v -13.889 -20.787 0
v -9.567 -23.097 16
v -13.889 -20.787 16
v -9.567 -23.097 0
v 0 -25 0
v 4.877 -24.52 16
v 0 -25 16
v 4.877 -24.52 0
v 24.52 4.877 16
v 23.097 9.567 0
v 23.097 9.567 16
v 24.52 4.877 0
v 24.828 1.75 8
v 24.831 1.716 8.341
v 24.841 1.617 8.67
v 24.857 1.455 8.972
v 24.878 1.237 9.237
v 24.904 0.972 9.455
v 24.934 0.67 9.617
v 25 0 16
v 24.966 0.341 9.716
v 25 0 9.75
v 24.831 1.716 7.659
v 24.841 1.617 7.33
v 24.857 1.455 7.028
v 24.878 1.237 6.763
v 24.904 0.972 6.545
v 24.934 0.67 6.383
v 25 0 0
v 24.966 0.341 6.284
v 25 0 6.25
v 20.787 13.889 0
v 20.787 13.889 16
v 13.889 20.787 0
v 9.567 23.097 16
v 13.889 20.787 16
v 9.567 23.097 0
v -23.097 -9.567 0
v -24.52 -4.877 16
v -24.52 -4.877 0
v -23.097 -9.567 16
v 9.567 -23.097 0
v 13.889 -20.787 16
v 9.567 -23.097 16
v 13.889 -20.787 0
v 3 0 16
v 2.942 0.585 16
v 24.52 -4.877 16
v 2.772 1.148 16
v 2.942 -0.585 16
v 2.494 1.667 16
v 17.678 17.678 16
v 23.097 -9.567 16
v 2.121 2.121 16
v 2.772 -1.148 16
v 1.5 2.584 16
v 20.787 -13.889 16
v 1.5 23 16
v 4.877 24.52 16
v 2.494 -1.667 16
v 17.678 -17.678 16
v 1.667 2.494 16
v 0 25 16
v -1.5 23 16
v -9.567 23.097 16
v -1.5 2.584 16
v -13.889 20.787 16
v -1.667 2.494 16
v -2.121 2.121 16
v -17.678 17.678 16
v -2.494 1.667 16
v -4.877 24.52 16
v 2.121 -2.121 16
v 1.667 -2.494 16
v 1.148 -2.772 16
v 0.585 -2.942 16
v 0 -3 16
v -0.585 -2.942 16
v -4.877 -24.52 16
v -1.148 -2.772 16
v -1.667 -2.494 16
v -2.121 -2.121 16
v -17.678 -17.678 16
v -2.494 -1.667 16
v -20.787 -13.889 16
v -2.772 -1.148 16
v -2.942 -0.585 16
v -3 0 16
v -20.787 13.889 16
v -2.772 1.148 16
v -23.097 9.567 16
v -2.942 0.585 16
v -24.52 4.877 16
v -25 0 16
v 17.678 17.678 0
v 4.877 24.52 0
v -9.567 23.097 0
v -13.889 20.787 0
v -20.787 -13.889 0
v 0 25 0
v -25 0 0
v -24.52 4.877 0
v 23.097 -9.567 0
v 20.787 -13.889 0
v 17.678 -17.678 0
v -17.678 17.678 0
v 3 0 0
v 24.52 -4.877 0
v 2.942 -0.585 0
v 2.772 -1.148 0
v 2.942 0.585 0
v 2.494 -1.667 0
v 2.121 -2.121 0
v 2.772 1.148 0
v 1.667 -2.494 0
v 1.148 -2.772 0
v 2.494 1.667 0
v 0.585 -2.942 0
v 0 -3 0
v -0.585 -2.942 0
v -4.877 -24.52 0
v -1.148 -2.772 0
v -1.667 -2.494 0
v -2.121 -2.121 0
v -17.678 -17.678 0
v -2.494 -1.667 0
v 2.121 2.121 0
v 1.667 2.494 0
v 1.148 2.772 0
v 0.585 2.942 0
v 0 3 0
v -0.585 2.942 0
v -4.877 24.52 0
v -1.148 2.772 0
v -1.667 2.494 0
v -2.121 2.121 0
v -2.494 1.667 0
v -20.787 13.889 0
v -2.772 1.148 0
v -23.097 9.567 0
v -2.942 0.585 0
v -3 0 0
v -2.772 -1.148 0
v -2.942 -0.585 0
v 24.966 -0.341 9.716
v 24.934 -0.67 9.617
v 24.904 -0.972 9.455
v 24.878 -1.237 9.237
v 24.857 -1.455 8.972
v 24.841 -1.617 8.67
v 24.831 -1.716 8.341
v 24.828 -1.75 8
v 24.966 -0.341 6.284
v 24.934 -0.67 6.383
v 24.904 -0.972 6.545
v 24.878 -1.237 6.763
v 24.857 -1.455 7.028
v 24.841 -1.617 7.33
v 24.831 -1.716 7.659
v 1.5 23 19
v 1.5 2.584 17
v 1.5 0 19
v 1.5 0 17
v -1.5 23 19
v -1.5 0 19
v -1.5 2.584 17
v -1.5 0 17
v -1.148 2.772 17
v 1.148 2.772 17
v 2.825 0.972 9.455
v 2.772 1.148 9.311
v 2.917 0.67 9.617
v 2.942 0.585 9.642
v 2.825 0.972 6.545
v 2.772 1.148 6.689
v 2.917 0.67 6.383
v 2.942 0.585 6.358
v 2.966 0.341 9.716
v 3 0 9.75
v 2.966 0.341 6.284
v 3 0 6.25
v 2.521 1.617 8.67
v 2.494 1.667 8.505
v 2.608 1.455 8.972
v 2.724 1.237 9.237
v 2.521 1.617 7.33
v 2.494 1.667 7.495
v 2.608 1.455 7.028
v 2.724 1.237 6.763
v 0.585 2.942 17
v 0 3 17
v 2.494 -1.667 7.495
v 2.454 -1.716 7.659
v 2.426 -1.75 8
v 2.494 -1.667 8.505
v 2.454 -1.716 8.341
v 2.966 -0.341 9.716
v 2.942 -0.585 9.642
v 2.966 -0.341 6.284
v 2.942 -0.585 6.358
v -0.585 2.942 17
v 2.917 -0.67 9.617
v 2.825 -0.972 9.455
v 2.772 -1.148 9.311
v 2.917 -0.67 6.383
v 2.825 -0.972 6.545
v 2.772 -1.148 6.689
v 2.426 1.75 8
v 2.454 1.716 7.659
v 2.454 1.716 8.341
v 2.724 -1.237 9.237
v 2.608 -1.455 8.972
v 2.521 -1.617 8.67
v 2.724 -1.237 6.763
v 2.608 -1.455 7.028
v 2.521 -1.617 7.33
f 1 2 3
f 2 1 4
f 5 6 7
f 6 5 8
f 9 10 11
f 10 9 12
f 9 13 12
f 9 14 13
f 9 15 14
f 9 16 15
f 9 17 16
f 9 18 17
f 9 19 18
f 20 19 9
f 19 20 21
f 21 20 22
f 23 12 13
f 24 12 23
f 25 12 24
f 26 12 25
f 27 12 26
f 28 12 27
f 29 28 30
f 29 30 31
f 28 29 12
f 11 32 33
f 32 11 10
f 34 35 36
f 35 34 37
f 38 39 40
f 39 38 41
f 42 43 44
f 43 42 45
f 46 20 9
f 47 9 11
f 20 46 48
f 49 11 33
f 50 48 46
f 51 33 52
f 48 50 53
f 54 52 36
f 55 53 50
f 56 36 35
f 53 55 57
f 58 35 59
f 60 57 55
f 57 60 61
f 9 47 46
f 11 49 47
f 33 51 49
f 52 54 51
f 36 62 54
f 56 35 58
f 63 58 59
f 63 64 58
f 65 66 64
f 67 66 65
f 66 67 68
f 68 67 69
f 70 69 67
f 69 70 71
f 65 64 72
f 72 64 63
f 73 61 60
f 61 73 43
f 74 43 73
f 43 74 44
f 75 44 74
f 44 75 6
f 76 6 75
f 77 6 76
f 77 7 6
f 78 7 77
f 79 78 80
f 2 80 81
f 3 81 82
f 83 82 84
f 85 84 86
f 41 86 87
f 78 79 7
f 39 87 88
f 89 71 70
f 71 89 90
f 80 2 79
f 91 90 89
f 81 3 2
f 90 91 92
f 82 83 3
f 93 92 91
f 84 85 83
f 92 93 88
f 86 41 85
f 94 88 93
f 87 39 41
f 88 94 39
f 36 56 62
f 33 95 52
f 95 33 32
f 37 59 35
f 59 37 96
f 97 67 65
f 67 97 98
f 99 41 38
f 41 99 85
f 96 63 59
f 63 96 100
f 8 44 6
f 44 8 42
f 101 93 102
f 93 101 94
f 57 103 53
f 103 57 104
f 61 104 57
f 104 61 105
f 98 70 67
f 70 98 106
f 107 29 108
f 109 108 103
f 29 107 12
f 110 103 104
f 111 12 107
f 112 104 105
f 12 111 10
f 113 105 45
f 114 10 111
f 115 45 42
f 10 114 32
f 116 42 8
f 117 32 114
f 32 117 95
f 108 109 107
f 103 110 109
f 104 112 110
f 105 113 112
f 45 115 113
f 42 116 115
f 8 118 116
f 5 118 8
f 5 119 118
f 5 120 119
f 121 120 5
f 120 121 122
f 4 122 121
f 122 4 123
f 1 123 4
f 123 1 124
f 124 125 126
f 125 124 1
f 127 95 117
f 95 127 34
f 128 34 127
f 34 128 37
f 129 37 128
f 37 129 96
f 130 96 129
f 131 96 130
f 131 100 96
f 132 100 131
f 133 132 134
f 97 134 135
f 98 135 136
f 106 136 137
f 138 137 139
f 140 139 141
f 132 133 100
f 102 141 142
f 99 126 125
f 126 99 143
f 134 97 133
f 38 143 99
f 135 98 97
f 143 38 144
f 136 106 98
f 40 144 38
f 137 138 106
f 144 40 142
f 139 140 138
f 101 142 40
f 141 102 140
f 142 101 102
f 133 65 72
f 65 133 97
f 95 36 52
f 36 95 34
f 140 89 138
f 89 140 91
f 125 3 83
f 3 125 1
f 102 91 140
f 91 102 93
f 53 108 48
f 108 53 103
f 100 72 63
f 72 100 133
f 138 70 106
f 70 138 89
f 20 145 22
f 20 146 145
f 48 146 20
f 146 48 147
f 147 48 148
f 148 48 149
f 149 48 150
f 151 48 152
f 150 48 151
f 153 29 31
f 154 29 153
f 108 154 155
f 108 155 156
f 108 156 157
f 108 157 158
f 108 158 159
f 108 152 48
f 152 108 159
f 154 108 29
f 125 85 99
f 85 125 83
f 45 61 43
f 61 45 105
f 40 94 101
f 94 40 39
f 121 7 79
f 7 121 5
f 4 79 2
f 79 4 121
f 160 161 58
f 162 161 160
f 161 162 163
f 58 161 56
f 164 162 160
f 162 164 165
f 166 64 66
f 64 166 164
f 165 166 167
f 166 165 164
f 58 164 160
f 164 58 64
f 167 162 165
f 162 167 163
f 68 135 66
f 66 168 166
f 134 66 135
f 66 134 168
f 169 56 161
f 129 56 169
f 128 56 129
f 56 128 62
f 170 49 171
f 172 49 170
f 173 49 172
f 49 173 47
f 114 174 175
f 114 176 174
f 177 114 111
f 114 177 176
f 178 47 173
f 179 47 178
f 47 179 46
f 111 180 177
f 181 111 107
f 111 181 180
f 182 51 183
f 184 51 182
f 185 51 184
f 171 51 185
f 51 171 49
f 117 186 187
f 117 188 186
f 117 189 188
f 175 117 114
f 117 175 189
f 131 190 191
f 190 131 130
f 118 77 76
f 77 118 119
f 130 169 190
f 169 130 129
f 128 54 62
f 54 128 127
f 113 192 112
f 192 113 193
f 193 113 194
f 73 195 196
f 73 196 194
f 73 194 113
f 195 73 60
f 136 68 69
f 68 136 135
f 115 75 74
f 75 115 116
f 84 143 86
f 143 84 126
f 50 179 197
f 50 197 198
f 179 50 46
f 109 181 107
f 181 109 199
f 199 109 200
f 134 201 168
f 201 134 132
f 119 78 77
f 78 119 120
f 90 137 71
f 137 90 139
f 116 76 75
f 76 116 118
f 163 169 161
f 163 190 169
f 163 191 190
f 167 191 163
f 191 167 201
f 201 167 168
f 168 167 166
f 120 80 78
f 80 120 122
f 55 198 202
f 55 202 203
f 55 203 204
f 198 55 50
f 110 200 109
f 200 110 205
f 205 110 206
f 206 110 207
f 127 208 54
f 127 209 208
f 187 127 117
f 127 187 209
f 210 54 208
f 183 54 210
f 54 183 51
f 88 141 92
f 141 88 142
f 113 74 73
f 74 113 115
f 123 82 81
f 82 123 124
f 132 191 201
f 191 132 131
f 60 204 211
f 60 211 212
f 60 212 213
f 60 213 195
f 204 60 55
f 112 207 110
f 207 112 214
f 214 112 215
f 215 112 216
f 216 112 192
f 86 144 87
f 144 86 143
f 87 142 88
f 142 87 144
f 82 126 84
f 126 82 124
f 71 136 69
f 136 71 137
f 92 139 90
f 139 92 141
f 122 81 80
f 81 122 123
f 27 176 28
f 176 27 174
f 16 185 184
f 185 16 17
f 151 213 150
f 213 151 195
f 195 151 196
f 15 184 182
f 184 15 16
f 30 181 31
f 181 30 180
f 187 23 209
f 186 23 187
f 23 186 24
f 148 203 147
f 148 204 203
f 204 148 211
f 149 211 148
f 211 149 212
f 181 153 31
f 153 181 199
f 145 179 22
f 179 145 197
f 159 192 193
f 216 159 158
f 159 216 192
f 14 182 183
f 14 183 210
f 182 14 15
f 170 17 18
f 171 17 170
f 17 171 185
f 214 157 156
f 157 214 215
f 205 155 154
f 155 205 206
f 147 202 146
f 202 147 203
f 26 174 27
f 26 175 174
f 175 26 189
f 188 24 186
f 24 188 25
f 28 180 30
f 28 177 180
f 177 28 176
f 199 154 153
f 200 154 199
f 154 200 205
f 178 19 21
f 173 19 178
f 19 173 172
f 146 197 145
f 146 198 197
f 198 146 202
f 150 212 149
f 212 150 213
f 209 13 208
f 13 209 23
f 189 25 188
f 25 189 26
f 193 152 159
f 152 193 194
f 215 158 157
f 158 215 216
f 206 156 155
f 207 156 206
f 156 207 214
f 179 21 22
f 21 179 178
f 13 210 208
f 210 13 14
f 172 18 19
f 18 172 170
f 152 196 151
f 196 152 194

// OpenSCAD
$fn = 32;

// ----------------------------------------------------------------------
// Control knob: pointer knob
// ----------------------------------------------------------------------

// --- parameters (mm) ---
rib_w = 3;                // pointer rib width
rib_h = 4;                // pointer rib height
knob_d = 50;              // knob body diameter
knob_h = 16;              // knob body height
bore_d = 6;               // shaft bore diameter
set_d = 3.5;              // set screw bore diameter

rib_poke = rib_h - 1;  // rib height above the top
total_h = knob_h + rib_h - 1;  // overall height

difference() {
  union() {
    cylinder(h = knob_h, d = knob_d);
    translate([-rib_w / 2, 0, knob_h - 1])
      cube([rib_w, knob_d / 2 - 2, rib_h]);
  }
  translate([0, 0, -1]) cylinder(h = knob_h + 2, d = bore_d);
  translate([-1, 0, knob_h / 2]) rotate([0, 90, 0])
    cylinder(h = knob_d / 2 + bore_d / 2 + 2, d = set_d);}
